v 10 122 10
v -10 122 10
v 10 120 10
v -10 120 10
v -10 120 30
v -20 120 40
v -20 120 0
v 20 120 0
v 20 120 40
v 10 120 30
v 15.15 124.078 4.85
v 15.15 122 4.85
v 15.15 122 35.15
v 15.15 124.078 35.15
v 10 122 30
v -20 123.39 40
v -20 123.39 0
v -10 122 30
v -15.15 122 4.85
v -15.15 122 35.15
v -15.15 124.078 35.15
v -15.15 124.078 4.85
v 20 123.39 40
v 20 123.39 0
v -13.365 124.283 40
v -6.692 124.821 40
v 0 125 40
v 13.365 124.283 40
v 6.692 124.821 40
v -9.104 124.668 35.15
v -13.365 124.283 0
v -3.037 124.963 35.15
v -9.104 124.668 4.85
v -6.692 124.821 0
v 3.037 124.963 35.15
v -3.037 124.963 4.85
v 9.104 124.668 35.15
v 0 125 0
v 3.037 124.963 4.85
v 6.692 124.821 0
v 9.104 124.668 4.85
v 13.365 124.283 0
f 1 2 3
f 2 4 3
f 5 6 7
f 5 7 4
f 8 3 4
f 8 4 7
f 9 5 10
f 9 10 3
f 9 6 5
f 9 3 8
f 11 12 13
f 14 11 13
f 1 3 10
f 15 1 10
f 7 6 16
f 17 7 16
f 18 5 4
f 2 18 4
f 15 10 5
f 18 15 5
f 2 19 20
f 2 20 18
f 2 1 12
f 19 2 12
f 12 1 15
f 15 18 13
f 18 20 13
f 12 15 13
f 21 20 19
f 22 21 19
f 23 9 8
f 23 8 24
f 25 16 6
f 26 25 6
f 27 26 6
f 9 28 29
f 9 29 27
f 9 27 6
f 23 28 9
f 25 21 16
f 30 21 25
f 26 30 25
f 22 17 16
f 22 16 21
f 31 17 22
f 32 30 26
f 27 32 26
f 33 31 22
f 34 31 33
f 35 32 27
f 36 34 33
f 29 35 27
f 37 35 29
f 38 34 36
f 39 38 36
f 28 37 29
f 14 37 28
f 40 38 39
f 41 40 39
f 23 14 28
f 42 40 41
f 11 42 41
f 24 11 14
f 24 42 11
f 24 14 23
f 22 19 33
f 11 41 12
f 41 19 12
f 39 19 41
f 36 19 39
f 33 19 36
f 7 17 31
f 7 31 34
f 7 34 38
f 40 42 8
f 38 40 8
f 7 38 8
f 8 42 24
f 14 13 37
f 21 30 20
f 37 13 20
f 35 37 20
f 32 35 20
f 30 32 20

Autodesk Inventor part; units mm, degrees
ref_plane "YZ Plane" through (0, 0, 0) normal (1, 0, 0) x (0, 1, 0)
ref_plane "XZ Plane" through (0, 0, 0) normal (0, 1, 0) x (-1, 0, 0)
ref_plane "XY Plane" through (0, 0, 0) normal (0, 0, 1) x (1, 0, 0)
sketch "Sketch1" plane through (0, 0, 0) normal (0, 0, 1) x (1, 0, 0)
  arc A0 (20, 123.3896) -> (-20, 123.3896) centre (0, 0) ccw
  line L0 (20, 120) -> (-20, 120)
  line L1 (-20, 120) -> (-20, 123.3896)
  line L2 (20, 120) -> (20, 123.3896)
  line L3 (0, 0) -> (0, 32.1156) construction
  point P0 (0, 125)
  dimension "d0" = 250
  dimension "d1" = 40
  dimension "d2" = 5
extrude "Extrusion1" add sketch "Sketch1" along normal blind 40
sketch "Sketch2" plane through (-20, 120, 0) normal (0, -1, 0) x (1, 0, 0)
  line L0 (4.85, 4.85) -> (35.15, 4.85)
  line L1 (35.15, 4.85) -> (35.15, 35.15)
  line L2 (35.15, 35.15) -> (4.85, 35.15)
  line L3 (4.85, 35.15) -> (4.85, 4.85)
  line L4 (4.85, 4.85) -> (35.15, 35.15) construction
  line L5 (35.15, 4.85) -> (4.85, 35.15) construction
  line L6 (40, 0) -> (40, 40) projected
  line L7 (40, 0) -> (0, 0) projected
  point P0 (20, 0)
  point P1 (20, 20)
  point P2 (40, 20)
  point P3 (20, 0)
  dimension "d6" = 30.3
  dimension "d7" = 30.3
extrude "Extrusion2" cut sketch "Sketch2" against normal blind 30
sketch "Sketch3" plane through (-20, 120, 0) normal (0, -1, 0) x (1, 0, 0)
  line L0 (35.15, 35.15) -> (35.15, 4.85) projected
  line L1 (4.85, 35.15) -> (35.15, 35.15)
  line L2 (35.15, 35.15) -> (35.15, 4.85)
  line L3 (35.15, 4.85) -> (4.85, 4.85)
  line L4 (4.85, 4.85) -> (4.85, 35.15)
  line L5 (4.85, 35.15) -> (35.15, 4.85) construction
  line L6 (35.15, 35.15) -> (4.85, 4.85) construction
  line L7 (10, 10) -> (30, 10)
  line L8 (30, 10) -> (30, 30)
  line L9 (30, 30) -> (10, 30)
  line L10 (10, 30) -> (10, 10)
  line L11 (10, 10) -> (30, 30) construction
  line L12 (30, 10) -> (10, 30) construction
  point P0 (20, 0)
  point P1 (20, 20)
  dimension "d10" = 20
extrude "Extrusion3" add sketch "Sketch3" against normal blind 2
properties part number "cooler_plate_socket" material "Acetal Resin, Black"
